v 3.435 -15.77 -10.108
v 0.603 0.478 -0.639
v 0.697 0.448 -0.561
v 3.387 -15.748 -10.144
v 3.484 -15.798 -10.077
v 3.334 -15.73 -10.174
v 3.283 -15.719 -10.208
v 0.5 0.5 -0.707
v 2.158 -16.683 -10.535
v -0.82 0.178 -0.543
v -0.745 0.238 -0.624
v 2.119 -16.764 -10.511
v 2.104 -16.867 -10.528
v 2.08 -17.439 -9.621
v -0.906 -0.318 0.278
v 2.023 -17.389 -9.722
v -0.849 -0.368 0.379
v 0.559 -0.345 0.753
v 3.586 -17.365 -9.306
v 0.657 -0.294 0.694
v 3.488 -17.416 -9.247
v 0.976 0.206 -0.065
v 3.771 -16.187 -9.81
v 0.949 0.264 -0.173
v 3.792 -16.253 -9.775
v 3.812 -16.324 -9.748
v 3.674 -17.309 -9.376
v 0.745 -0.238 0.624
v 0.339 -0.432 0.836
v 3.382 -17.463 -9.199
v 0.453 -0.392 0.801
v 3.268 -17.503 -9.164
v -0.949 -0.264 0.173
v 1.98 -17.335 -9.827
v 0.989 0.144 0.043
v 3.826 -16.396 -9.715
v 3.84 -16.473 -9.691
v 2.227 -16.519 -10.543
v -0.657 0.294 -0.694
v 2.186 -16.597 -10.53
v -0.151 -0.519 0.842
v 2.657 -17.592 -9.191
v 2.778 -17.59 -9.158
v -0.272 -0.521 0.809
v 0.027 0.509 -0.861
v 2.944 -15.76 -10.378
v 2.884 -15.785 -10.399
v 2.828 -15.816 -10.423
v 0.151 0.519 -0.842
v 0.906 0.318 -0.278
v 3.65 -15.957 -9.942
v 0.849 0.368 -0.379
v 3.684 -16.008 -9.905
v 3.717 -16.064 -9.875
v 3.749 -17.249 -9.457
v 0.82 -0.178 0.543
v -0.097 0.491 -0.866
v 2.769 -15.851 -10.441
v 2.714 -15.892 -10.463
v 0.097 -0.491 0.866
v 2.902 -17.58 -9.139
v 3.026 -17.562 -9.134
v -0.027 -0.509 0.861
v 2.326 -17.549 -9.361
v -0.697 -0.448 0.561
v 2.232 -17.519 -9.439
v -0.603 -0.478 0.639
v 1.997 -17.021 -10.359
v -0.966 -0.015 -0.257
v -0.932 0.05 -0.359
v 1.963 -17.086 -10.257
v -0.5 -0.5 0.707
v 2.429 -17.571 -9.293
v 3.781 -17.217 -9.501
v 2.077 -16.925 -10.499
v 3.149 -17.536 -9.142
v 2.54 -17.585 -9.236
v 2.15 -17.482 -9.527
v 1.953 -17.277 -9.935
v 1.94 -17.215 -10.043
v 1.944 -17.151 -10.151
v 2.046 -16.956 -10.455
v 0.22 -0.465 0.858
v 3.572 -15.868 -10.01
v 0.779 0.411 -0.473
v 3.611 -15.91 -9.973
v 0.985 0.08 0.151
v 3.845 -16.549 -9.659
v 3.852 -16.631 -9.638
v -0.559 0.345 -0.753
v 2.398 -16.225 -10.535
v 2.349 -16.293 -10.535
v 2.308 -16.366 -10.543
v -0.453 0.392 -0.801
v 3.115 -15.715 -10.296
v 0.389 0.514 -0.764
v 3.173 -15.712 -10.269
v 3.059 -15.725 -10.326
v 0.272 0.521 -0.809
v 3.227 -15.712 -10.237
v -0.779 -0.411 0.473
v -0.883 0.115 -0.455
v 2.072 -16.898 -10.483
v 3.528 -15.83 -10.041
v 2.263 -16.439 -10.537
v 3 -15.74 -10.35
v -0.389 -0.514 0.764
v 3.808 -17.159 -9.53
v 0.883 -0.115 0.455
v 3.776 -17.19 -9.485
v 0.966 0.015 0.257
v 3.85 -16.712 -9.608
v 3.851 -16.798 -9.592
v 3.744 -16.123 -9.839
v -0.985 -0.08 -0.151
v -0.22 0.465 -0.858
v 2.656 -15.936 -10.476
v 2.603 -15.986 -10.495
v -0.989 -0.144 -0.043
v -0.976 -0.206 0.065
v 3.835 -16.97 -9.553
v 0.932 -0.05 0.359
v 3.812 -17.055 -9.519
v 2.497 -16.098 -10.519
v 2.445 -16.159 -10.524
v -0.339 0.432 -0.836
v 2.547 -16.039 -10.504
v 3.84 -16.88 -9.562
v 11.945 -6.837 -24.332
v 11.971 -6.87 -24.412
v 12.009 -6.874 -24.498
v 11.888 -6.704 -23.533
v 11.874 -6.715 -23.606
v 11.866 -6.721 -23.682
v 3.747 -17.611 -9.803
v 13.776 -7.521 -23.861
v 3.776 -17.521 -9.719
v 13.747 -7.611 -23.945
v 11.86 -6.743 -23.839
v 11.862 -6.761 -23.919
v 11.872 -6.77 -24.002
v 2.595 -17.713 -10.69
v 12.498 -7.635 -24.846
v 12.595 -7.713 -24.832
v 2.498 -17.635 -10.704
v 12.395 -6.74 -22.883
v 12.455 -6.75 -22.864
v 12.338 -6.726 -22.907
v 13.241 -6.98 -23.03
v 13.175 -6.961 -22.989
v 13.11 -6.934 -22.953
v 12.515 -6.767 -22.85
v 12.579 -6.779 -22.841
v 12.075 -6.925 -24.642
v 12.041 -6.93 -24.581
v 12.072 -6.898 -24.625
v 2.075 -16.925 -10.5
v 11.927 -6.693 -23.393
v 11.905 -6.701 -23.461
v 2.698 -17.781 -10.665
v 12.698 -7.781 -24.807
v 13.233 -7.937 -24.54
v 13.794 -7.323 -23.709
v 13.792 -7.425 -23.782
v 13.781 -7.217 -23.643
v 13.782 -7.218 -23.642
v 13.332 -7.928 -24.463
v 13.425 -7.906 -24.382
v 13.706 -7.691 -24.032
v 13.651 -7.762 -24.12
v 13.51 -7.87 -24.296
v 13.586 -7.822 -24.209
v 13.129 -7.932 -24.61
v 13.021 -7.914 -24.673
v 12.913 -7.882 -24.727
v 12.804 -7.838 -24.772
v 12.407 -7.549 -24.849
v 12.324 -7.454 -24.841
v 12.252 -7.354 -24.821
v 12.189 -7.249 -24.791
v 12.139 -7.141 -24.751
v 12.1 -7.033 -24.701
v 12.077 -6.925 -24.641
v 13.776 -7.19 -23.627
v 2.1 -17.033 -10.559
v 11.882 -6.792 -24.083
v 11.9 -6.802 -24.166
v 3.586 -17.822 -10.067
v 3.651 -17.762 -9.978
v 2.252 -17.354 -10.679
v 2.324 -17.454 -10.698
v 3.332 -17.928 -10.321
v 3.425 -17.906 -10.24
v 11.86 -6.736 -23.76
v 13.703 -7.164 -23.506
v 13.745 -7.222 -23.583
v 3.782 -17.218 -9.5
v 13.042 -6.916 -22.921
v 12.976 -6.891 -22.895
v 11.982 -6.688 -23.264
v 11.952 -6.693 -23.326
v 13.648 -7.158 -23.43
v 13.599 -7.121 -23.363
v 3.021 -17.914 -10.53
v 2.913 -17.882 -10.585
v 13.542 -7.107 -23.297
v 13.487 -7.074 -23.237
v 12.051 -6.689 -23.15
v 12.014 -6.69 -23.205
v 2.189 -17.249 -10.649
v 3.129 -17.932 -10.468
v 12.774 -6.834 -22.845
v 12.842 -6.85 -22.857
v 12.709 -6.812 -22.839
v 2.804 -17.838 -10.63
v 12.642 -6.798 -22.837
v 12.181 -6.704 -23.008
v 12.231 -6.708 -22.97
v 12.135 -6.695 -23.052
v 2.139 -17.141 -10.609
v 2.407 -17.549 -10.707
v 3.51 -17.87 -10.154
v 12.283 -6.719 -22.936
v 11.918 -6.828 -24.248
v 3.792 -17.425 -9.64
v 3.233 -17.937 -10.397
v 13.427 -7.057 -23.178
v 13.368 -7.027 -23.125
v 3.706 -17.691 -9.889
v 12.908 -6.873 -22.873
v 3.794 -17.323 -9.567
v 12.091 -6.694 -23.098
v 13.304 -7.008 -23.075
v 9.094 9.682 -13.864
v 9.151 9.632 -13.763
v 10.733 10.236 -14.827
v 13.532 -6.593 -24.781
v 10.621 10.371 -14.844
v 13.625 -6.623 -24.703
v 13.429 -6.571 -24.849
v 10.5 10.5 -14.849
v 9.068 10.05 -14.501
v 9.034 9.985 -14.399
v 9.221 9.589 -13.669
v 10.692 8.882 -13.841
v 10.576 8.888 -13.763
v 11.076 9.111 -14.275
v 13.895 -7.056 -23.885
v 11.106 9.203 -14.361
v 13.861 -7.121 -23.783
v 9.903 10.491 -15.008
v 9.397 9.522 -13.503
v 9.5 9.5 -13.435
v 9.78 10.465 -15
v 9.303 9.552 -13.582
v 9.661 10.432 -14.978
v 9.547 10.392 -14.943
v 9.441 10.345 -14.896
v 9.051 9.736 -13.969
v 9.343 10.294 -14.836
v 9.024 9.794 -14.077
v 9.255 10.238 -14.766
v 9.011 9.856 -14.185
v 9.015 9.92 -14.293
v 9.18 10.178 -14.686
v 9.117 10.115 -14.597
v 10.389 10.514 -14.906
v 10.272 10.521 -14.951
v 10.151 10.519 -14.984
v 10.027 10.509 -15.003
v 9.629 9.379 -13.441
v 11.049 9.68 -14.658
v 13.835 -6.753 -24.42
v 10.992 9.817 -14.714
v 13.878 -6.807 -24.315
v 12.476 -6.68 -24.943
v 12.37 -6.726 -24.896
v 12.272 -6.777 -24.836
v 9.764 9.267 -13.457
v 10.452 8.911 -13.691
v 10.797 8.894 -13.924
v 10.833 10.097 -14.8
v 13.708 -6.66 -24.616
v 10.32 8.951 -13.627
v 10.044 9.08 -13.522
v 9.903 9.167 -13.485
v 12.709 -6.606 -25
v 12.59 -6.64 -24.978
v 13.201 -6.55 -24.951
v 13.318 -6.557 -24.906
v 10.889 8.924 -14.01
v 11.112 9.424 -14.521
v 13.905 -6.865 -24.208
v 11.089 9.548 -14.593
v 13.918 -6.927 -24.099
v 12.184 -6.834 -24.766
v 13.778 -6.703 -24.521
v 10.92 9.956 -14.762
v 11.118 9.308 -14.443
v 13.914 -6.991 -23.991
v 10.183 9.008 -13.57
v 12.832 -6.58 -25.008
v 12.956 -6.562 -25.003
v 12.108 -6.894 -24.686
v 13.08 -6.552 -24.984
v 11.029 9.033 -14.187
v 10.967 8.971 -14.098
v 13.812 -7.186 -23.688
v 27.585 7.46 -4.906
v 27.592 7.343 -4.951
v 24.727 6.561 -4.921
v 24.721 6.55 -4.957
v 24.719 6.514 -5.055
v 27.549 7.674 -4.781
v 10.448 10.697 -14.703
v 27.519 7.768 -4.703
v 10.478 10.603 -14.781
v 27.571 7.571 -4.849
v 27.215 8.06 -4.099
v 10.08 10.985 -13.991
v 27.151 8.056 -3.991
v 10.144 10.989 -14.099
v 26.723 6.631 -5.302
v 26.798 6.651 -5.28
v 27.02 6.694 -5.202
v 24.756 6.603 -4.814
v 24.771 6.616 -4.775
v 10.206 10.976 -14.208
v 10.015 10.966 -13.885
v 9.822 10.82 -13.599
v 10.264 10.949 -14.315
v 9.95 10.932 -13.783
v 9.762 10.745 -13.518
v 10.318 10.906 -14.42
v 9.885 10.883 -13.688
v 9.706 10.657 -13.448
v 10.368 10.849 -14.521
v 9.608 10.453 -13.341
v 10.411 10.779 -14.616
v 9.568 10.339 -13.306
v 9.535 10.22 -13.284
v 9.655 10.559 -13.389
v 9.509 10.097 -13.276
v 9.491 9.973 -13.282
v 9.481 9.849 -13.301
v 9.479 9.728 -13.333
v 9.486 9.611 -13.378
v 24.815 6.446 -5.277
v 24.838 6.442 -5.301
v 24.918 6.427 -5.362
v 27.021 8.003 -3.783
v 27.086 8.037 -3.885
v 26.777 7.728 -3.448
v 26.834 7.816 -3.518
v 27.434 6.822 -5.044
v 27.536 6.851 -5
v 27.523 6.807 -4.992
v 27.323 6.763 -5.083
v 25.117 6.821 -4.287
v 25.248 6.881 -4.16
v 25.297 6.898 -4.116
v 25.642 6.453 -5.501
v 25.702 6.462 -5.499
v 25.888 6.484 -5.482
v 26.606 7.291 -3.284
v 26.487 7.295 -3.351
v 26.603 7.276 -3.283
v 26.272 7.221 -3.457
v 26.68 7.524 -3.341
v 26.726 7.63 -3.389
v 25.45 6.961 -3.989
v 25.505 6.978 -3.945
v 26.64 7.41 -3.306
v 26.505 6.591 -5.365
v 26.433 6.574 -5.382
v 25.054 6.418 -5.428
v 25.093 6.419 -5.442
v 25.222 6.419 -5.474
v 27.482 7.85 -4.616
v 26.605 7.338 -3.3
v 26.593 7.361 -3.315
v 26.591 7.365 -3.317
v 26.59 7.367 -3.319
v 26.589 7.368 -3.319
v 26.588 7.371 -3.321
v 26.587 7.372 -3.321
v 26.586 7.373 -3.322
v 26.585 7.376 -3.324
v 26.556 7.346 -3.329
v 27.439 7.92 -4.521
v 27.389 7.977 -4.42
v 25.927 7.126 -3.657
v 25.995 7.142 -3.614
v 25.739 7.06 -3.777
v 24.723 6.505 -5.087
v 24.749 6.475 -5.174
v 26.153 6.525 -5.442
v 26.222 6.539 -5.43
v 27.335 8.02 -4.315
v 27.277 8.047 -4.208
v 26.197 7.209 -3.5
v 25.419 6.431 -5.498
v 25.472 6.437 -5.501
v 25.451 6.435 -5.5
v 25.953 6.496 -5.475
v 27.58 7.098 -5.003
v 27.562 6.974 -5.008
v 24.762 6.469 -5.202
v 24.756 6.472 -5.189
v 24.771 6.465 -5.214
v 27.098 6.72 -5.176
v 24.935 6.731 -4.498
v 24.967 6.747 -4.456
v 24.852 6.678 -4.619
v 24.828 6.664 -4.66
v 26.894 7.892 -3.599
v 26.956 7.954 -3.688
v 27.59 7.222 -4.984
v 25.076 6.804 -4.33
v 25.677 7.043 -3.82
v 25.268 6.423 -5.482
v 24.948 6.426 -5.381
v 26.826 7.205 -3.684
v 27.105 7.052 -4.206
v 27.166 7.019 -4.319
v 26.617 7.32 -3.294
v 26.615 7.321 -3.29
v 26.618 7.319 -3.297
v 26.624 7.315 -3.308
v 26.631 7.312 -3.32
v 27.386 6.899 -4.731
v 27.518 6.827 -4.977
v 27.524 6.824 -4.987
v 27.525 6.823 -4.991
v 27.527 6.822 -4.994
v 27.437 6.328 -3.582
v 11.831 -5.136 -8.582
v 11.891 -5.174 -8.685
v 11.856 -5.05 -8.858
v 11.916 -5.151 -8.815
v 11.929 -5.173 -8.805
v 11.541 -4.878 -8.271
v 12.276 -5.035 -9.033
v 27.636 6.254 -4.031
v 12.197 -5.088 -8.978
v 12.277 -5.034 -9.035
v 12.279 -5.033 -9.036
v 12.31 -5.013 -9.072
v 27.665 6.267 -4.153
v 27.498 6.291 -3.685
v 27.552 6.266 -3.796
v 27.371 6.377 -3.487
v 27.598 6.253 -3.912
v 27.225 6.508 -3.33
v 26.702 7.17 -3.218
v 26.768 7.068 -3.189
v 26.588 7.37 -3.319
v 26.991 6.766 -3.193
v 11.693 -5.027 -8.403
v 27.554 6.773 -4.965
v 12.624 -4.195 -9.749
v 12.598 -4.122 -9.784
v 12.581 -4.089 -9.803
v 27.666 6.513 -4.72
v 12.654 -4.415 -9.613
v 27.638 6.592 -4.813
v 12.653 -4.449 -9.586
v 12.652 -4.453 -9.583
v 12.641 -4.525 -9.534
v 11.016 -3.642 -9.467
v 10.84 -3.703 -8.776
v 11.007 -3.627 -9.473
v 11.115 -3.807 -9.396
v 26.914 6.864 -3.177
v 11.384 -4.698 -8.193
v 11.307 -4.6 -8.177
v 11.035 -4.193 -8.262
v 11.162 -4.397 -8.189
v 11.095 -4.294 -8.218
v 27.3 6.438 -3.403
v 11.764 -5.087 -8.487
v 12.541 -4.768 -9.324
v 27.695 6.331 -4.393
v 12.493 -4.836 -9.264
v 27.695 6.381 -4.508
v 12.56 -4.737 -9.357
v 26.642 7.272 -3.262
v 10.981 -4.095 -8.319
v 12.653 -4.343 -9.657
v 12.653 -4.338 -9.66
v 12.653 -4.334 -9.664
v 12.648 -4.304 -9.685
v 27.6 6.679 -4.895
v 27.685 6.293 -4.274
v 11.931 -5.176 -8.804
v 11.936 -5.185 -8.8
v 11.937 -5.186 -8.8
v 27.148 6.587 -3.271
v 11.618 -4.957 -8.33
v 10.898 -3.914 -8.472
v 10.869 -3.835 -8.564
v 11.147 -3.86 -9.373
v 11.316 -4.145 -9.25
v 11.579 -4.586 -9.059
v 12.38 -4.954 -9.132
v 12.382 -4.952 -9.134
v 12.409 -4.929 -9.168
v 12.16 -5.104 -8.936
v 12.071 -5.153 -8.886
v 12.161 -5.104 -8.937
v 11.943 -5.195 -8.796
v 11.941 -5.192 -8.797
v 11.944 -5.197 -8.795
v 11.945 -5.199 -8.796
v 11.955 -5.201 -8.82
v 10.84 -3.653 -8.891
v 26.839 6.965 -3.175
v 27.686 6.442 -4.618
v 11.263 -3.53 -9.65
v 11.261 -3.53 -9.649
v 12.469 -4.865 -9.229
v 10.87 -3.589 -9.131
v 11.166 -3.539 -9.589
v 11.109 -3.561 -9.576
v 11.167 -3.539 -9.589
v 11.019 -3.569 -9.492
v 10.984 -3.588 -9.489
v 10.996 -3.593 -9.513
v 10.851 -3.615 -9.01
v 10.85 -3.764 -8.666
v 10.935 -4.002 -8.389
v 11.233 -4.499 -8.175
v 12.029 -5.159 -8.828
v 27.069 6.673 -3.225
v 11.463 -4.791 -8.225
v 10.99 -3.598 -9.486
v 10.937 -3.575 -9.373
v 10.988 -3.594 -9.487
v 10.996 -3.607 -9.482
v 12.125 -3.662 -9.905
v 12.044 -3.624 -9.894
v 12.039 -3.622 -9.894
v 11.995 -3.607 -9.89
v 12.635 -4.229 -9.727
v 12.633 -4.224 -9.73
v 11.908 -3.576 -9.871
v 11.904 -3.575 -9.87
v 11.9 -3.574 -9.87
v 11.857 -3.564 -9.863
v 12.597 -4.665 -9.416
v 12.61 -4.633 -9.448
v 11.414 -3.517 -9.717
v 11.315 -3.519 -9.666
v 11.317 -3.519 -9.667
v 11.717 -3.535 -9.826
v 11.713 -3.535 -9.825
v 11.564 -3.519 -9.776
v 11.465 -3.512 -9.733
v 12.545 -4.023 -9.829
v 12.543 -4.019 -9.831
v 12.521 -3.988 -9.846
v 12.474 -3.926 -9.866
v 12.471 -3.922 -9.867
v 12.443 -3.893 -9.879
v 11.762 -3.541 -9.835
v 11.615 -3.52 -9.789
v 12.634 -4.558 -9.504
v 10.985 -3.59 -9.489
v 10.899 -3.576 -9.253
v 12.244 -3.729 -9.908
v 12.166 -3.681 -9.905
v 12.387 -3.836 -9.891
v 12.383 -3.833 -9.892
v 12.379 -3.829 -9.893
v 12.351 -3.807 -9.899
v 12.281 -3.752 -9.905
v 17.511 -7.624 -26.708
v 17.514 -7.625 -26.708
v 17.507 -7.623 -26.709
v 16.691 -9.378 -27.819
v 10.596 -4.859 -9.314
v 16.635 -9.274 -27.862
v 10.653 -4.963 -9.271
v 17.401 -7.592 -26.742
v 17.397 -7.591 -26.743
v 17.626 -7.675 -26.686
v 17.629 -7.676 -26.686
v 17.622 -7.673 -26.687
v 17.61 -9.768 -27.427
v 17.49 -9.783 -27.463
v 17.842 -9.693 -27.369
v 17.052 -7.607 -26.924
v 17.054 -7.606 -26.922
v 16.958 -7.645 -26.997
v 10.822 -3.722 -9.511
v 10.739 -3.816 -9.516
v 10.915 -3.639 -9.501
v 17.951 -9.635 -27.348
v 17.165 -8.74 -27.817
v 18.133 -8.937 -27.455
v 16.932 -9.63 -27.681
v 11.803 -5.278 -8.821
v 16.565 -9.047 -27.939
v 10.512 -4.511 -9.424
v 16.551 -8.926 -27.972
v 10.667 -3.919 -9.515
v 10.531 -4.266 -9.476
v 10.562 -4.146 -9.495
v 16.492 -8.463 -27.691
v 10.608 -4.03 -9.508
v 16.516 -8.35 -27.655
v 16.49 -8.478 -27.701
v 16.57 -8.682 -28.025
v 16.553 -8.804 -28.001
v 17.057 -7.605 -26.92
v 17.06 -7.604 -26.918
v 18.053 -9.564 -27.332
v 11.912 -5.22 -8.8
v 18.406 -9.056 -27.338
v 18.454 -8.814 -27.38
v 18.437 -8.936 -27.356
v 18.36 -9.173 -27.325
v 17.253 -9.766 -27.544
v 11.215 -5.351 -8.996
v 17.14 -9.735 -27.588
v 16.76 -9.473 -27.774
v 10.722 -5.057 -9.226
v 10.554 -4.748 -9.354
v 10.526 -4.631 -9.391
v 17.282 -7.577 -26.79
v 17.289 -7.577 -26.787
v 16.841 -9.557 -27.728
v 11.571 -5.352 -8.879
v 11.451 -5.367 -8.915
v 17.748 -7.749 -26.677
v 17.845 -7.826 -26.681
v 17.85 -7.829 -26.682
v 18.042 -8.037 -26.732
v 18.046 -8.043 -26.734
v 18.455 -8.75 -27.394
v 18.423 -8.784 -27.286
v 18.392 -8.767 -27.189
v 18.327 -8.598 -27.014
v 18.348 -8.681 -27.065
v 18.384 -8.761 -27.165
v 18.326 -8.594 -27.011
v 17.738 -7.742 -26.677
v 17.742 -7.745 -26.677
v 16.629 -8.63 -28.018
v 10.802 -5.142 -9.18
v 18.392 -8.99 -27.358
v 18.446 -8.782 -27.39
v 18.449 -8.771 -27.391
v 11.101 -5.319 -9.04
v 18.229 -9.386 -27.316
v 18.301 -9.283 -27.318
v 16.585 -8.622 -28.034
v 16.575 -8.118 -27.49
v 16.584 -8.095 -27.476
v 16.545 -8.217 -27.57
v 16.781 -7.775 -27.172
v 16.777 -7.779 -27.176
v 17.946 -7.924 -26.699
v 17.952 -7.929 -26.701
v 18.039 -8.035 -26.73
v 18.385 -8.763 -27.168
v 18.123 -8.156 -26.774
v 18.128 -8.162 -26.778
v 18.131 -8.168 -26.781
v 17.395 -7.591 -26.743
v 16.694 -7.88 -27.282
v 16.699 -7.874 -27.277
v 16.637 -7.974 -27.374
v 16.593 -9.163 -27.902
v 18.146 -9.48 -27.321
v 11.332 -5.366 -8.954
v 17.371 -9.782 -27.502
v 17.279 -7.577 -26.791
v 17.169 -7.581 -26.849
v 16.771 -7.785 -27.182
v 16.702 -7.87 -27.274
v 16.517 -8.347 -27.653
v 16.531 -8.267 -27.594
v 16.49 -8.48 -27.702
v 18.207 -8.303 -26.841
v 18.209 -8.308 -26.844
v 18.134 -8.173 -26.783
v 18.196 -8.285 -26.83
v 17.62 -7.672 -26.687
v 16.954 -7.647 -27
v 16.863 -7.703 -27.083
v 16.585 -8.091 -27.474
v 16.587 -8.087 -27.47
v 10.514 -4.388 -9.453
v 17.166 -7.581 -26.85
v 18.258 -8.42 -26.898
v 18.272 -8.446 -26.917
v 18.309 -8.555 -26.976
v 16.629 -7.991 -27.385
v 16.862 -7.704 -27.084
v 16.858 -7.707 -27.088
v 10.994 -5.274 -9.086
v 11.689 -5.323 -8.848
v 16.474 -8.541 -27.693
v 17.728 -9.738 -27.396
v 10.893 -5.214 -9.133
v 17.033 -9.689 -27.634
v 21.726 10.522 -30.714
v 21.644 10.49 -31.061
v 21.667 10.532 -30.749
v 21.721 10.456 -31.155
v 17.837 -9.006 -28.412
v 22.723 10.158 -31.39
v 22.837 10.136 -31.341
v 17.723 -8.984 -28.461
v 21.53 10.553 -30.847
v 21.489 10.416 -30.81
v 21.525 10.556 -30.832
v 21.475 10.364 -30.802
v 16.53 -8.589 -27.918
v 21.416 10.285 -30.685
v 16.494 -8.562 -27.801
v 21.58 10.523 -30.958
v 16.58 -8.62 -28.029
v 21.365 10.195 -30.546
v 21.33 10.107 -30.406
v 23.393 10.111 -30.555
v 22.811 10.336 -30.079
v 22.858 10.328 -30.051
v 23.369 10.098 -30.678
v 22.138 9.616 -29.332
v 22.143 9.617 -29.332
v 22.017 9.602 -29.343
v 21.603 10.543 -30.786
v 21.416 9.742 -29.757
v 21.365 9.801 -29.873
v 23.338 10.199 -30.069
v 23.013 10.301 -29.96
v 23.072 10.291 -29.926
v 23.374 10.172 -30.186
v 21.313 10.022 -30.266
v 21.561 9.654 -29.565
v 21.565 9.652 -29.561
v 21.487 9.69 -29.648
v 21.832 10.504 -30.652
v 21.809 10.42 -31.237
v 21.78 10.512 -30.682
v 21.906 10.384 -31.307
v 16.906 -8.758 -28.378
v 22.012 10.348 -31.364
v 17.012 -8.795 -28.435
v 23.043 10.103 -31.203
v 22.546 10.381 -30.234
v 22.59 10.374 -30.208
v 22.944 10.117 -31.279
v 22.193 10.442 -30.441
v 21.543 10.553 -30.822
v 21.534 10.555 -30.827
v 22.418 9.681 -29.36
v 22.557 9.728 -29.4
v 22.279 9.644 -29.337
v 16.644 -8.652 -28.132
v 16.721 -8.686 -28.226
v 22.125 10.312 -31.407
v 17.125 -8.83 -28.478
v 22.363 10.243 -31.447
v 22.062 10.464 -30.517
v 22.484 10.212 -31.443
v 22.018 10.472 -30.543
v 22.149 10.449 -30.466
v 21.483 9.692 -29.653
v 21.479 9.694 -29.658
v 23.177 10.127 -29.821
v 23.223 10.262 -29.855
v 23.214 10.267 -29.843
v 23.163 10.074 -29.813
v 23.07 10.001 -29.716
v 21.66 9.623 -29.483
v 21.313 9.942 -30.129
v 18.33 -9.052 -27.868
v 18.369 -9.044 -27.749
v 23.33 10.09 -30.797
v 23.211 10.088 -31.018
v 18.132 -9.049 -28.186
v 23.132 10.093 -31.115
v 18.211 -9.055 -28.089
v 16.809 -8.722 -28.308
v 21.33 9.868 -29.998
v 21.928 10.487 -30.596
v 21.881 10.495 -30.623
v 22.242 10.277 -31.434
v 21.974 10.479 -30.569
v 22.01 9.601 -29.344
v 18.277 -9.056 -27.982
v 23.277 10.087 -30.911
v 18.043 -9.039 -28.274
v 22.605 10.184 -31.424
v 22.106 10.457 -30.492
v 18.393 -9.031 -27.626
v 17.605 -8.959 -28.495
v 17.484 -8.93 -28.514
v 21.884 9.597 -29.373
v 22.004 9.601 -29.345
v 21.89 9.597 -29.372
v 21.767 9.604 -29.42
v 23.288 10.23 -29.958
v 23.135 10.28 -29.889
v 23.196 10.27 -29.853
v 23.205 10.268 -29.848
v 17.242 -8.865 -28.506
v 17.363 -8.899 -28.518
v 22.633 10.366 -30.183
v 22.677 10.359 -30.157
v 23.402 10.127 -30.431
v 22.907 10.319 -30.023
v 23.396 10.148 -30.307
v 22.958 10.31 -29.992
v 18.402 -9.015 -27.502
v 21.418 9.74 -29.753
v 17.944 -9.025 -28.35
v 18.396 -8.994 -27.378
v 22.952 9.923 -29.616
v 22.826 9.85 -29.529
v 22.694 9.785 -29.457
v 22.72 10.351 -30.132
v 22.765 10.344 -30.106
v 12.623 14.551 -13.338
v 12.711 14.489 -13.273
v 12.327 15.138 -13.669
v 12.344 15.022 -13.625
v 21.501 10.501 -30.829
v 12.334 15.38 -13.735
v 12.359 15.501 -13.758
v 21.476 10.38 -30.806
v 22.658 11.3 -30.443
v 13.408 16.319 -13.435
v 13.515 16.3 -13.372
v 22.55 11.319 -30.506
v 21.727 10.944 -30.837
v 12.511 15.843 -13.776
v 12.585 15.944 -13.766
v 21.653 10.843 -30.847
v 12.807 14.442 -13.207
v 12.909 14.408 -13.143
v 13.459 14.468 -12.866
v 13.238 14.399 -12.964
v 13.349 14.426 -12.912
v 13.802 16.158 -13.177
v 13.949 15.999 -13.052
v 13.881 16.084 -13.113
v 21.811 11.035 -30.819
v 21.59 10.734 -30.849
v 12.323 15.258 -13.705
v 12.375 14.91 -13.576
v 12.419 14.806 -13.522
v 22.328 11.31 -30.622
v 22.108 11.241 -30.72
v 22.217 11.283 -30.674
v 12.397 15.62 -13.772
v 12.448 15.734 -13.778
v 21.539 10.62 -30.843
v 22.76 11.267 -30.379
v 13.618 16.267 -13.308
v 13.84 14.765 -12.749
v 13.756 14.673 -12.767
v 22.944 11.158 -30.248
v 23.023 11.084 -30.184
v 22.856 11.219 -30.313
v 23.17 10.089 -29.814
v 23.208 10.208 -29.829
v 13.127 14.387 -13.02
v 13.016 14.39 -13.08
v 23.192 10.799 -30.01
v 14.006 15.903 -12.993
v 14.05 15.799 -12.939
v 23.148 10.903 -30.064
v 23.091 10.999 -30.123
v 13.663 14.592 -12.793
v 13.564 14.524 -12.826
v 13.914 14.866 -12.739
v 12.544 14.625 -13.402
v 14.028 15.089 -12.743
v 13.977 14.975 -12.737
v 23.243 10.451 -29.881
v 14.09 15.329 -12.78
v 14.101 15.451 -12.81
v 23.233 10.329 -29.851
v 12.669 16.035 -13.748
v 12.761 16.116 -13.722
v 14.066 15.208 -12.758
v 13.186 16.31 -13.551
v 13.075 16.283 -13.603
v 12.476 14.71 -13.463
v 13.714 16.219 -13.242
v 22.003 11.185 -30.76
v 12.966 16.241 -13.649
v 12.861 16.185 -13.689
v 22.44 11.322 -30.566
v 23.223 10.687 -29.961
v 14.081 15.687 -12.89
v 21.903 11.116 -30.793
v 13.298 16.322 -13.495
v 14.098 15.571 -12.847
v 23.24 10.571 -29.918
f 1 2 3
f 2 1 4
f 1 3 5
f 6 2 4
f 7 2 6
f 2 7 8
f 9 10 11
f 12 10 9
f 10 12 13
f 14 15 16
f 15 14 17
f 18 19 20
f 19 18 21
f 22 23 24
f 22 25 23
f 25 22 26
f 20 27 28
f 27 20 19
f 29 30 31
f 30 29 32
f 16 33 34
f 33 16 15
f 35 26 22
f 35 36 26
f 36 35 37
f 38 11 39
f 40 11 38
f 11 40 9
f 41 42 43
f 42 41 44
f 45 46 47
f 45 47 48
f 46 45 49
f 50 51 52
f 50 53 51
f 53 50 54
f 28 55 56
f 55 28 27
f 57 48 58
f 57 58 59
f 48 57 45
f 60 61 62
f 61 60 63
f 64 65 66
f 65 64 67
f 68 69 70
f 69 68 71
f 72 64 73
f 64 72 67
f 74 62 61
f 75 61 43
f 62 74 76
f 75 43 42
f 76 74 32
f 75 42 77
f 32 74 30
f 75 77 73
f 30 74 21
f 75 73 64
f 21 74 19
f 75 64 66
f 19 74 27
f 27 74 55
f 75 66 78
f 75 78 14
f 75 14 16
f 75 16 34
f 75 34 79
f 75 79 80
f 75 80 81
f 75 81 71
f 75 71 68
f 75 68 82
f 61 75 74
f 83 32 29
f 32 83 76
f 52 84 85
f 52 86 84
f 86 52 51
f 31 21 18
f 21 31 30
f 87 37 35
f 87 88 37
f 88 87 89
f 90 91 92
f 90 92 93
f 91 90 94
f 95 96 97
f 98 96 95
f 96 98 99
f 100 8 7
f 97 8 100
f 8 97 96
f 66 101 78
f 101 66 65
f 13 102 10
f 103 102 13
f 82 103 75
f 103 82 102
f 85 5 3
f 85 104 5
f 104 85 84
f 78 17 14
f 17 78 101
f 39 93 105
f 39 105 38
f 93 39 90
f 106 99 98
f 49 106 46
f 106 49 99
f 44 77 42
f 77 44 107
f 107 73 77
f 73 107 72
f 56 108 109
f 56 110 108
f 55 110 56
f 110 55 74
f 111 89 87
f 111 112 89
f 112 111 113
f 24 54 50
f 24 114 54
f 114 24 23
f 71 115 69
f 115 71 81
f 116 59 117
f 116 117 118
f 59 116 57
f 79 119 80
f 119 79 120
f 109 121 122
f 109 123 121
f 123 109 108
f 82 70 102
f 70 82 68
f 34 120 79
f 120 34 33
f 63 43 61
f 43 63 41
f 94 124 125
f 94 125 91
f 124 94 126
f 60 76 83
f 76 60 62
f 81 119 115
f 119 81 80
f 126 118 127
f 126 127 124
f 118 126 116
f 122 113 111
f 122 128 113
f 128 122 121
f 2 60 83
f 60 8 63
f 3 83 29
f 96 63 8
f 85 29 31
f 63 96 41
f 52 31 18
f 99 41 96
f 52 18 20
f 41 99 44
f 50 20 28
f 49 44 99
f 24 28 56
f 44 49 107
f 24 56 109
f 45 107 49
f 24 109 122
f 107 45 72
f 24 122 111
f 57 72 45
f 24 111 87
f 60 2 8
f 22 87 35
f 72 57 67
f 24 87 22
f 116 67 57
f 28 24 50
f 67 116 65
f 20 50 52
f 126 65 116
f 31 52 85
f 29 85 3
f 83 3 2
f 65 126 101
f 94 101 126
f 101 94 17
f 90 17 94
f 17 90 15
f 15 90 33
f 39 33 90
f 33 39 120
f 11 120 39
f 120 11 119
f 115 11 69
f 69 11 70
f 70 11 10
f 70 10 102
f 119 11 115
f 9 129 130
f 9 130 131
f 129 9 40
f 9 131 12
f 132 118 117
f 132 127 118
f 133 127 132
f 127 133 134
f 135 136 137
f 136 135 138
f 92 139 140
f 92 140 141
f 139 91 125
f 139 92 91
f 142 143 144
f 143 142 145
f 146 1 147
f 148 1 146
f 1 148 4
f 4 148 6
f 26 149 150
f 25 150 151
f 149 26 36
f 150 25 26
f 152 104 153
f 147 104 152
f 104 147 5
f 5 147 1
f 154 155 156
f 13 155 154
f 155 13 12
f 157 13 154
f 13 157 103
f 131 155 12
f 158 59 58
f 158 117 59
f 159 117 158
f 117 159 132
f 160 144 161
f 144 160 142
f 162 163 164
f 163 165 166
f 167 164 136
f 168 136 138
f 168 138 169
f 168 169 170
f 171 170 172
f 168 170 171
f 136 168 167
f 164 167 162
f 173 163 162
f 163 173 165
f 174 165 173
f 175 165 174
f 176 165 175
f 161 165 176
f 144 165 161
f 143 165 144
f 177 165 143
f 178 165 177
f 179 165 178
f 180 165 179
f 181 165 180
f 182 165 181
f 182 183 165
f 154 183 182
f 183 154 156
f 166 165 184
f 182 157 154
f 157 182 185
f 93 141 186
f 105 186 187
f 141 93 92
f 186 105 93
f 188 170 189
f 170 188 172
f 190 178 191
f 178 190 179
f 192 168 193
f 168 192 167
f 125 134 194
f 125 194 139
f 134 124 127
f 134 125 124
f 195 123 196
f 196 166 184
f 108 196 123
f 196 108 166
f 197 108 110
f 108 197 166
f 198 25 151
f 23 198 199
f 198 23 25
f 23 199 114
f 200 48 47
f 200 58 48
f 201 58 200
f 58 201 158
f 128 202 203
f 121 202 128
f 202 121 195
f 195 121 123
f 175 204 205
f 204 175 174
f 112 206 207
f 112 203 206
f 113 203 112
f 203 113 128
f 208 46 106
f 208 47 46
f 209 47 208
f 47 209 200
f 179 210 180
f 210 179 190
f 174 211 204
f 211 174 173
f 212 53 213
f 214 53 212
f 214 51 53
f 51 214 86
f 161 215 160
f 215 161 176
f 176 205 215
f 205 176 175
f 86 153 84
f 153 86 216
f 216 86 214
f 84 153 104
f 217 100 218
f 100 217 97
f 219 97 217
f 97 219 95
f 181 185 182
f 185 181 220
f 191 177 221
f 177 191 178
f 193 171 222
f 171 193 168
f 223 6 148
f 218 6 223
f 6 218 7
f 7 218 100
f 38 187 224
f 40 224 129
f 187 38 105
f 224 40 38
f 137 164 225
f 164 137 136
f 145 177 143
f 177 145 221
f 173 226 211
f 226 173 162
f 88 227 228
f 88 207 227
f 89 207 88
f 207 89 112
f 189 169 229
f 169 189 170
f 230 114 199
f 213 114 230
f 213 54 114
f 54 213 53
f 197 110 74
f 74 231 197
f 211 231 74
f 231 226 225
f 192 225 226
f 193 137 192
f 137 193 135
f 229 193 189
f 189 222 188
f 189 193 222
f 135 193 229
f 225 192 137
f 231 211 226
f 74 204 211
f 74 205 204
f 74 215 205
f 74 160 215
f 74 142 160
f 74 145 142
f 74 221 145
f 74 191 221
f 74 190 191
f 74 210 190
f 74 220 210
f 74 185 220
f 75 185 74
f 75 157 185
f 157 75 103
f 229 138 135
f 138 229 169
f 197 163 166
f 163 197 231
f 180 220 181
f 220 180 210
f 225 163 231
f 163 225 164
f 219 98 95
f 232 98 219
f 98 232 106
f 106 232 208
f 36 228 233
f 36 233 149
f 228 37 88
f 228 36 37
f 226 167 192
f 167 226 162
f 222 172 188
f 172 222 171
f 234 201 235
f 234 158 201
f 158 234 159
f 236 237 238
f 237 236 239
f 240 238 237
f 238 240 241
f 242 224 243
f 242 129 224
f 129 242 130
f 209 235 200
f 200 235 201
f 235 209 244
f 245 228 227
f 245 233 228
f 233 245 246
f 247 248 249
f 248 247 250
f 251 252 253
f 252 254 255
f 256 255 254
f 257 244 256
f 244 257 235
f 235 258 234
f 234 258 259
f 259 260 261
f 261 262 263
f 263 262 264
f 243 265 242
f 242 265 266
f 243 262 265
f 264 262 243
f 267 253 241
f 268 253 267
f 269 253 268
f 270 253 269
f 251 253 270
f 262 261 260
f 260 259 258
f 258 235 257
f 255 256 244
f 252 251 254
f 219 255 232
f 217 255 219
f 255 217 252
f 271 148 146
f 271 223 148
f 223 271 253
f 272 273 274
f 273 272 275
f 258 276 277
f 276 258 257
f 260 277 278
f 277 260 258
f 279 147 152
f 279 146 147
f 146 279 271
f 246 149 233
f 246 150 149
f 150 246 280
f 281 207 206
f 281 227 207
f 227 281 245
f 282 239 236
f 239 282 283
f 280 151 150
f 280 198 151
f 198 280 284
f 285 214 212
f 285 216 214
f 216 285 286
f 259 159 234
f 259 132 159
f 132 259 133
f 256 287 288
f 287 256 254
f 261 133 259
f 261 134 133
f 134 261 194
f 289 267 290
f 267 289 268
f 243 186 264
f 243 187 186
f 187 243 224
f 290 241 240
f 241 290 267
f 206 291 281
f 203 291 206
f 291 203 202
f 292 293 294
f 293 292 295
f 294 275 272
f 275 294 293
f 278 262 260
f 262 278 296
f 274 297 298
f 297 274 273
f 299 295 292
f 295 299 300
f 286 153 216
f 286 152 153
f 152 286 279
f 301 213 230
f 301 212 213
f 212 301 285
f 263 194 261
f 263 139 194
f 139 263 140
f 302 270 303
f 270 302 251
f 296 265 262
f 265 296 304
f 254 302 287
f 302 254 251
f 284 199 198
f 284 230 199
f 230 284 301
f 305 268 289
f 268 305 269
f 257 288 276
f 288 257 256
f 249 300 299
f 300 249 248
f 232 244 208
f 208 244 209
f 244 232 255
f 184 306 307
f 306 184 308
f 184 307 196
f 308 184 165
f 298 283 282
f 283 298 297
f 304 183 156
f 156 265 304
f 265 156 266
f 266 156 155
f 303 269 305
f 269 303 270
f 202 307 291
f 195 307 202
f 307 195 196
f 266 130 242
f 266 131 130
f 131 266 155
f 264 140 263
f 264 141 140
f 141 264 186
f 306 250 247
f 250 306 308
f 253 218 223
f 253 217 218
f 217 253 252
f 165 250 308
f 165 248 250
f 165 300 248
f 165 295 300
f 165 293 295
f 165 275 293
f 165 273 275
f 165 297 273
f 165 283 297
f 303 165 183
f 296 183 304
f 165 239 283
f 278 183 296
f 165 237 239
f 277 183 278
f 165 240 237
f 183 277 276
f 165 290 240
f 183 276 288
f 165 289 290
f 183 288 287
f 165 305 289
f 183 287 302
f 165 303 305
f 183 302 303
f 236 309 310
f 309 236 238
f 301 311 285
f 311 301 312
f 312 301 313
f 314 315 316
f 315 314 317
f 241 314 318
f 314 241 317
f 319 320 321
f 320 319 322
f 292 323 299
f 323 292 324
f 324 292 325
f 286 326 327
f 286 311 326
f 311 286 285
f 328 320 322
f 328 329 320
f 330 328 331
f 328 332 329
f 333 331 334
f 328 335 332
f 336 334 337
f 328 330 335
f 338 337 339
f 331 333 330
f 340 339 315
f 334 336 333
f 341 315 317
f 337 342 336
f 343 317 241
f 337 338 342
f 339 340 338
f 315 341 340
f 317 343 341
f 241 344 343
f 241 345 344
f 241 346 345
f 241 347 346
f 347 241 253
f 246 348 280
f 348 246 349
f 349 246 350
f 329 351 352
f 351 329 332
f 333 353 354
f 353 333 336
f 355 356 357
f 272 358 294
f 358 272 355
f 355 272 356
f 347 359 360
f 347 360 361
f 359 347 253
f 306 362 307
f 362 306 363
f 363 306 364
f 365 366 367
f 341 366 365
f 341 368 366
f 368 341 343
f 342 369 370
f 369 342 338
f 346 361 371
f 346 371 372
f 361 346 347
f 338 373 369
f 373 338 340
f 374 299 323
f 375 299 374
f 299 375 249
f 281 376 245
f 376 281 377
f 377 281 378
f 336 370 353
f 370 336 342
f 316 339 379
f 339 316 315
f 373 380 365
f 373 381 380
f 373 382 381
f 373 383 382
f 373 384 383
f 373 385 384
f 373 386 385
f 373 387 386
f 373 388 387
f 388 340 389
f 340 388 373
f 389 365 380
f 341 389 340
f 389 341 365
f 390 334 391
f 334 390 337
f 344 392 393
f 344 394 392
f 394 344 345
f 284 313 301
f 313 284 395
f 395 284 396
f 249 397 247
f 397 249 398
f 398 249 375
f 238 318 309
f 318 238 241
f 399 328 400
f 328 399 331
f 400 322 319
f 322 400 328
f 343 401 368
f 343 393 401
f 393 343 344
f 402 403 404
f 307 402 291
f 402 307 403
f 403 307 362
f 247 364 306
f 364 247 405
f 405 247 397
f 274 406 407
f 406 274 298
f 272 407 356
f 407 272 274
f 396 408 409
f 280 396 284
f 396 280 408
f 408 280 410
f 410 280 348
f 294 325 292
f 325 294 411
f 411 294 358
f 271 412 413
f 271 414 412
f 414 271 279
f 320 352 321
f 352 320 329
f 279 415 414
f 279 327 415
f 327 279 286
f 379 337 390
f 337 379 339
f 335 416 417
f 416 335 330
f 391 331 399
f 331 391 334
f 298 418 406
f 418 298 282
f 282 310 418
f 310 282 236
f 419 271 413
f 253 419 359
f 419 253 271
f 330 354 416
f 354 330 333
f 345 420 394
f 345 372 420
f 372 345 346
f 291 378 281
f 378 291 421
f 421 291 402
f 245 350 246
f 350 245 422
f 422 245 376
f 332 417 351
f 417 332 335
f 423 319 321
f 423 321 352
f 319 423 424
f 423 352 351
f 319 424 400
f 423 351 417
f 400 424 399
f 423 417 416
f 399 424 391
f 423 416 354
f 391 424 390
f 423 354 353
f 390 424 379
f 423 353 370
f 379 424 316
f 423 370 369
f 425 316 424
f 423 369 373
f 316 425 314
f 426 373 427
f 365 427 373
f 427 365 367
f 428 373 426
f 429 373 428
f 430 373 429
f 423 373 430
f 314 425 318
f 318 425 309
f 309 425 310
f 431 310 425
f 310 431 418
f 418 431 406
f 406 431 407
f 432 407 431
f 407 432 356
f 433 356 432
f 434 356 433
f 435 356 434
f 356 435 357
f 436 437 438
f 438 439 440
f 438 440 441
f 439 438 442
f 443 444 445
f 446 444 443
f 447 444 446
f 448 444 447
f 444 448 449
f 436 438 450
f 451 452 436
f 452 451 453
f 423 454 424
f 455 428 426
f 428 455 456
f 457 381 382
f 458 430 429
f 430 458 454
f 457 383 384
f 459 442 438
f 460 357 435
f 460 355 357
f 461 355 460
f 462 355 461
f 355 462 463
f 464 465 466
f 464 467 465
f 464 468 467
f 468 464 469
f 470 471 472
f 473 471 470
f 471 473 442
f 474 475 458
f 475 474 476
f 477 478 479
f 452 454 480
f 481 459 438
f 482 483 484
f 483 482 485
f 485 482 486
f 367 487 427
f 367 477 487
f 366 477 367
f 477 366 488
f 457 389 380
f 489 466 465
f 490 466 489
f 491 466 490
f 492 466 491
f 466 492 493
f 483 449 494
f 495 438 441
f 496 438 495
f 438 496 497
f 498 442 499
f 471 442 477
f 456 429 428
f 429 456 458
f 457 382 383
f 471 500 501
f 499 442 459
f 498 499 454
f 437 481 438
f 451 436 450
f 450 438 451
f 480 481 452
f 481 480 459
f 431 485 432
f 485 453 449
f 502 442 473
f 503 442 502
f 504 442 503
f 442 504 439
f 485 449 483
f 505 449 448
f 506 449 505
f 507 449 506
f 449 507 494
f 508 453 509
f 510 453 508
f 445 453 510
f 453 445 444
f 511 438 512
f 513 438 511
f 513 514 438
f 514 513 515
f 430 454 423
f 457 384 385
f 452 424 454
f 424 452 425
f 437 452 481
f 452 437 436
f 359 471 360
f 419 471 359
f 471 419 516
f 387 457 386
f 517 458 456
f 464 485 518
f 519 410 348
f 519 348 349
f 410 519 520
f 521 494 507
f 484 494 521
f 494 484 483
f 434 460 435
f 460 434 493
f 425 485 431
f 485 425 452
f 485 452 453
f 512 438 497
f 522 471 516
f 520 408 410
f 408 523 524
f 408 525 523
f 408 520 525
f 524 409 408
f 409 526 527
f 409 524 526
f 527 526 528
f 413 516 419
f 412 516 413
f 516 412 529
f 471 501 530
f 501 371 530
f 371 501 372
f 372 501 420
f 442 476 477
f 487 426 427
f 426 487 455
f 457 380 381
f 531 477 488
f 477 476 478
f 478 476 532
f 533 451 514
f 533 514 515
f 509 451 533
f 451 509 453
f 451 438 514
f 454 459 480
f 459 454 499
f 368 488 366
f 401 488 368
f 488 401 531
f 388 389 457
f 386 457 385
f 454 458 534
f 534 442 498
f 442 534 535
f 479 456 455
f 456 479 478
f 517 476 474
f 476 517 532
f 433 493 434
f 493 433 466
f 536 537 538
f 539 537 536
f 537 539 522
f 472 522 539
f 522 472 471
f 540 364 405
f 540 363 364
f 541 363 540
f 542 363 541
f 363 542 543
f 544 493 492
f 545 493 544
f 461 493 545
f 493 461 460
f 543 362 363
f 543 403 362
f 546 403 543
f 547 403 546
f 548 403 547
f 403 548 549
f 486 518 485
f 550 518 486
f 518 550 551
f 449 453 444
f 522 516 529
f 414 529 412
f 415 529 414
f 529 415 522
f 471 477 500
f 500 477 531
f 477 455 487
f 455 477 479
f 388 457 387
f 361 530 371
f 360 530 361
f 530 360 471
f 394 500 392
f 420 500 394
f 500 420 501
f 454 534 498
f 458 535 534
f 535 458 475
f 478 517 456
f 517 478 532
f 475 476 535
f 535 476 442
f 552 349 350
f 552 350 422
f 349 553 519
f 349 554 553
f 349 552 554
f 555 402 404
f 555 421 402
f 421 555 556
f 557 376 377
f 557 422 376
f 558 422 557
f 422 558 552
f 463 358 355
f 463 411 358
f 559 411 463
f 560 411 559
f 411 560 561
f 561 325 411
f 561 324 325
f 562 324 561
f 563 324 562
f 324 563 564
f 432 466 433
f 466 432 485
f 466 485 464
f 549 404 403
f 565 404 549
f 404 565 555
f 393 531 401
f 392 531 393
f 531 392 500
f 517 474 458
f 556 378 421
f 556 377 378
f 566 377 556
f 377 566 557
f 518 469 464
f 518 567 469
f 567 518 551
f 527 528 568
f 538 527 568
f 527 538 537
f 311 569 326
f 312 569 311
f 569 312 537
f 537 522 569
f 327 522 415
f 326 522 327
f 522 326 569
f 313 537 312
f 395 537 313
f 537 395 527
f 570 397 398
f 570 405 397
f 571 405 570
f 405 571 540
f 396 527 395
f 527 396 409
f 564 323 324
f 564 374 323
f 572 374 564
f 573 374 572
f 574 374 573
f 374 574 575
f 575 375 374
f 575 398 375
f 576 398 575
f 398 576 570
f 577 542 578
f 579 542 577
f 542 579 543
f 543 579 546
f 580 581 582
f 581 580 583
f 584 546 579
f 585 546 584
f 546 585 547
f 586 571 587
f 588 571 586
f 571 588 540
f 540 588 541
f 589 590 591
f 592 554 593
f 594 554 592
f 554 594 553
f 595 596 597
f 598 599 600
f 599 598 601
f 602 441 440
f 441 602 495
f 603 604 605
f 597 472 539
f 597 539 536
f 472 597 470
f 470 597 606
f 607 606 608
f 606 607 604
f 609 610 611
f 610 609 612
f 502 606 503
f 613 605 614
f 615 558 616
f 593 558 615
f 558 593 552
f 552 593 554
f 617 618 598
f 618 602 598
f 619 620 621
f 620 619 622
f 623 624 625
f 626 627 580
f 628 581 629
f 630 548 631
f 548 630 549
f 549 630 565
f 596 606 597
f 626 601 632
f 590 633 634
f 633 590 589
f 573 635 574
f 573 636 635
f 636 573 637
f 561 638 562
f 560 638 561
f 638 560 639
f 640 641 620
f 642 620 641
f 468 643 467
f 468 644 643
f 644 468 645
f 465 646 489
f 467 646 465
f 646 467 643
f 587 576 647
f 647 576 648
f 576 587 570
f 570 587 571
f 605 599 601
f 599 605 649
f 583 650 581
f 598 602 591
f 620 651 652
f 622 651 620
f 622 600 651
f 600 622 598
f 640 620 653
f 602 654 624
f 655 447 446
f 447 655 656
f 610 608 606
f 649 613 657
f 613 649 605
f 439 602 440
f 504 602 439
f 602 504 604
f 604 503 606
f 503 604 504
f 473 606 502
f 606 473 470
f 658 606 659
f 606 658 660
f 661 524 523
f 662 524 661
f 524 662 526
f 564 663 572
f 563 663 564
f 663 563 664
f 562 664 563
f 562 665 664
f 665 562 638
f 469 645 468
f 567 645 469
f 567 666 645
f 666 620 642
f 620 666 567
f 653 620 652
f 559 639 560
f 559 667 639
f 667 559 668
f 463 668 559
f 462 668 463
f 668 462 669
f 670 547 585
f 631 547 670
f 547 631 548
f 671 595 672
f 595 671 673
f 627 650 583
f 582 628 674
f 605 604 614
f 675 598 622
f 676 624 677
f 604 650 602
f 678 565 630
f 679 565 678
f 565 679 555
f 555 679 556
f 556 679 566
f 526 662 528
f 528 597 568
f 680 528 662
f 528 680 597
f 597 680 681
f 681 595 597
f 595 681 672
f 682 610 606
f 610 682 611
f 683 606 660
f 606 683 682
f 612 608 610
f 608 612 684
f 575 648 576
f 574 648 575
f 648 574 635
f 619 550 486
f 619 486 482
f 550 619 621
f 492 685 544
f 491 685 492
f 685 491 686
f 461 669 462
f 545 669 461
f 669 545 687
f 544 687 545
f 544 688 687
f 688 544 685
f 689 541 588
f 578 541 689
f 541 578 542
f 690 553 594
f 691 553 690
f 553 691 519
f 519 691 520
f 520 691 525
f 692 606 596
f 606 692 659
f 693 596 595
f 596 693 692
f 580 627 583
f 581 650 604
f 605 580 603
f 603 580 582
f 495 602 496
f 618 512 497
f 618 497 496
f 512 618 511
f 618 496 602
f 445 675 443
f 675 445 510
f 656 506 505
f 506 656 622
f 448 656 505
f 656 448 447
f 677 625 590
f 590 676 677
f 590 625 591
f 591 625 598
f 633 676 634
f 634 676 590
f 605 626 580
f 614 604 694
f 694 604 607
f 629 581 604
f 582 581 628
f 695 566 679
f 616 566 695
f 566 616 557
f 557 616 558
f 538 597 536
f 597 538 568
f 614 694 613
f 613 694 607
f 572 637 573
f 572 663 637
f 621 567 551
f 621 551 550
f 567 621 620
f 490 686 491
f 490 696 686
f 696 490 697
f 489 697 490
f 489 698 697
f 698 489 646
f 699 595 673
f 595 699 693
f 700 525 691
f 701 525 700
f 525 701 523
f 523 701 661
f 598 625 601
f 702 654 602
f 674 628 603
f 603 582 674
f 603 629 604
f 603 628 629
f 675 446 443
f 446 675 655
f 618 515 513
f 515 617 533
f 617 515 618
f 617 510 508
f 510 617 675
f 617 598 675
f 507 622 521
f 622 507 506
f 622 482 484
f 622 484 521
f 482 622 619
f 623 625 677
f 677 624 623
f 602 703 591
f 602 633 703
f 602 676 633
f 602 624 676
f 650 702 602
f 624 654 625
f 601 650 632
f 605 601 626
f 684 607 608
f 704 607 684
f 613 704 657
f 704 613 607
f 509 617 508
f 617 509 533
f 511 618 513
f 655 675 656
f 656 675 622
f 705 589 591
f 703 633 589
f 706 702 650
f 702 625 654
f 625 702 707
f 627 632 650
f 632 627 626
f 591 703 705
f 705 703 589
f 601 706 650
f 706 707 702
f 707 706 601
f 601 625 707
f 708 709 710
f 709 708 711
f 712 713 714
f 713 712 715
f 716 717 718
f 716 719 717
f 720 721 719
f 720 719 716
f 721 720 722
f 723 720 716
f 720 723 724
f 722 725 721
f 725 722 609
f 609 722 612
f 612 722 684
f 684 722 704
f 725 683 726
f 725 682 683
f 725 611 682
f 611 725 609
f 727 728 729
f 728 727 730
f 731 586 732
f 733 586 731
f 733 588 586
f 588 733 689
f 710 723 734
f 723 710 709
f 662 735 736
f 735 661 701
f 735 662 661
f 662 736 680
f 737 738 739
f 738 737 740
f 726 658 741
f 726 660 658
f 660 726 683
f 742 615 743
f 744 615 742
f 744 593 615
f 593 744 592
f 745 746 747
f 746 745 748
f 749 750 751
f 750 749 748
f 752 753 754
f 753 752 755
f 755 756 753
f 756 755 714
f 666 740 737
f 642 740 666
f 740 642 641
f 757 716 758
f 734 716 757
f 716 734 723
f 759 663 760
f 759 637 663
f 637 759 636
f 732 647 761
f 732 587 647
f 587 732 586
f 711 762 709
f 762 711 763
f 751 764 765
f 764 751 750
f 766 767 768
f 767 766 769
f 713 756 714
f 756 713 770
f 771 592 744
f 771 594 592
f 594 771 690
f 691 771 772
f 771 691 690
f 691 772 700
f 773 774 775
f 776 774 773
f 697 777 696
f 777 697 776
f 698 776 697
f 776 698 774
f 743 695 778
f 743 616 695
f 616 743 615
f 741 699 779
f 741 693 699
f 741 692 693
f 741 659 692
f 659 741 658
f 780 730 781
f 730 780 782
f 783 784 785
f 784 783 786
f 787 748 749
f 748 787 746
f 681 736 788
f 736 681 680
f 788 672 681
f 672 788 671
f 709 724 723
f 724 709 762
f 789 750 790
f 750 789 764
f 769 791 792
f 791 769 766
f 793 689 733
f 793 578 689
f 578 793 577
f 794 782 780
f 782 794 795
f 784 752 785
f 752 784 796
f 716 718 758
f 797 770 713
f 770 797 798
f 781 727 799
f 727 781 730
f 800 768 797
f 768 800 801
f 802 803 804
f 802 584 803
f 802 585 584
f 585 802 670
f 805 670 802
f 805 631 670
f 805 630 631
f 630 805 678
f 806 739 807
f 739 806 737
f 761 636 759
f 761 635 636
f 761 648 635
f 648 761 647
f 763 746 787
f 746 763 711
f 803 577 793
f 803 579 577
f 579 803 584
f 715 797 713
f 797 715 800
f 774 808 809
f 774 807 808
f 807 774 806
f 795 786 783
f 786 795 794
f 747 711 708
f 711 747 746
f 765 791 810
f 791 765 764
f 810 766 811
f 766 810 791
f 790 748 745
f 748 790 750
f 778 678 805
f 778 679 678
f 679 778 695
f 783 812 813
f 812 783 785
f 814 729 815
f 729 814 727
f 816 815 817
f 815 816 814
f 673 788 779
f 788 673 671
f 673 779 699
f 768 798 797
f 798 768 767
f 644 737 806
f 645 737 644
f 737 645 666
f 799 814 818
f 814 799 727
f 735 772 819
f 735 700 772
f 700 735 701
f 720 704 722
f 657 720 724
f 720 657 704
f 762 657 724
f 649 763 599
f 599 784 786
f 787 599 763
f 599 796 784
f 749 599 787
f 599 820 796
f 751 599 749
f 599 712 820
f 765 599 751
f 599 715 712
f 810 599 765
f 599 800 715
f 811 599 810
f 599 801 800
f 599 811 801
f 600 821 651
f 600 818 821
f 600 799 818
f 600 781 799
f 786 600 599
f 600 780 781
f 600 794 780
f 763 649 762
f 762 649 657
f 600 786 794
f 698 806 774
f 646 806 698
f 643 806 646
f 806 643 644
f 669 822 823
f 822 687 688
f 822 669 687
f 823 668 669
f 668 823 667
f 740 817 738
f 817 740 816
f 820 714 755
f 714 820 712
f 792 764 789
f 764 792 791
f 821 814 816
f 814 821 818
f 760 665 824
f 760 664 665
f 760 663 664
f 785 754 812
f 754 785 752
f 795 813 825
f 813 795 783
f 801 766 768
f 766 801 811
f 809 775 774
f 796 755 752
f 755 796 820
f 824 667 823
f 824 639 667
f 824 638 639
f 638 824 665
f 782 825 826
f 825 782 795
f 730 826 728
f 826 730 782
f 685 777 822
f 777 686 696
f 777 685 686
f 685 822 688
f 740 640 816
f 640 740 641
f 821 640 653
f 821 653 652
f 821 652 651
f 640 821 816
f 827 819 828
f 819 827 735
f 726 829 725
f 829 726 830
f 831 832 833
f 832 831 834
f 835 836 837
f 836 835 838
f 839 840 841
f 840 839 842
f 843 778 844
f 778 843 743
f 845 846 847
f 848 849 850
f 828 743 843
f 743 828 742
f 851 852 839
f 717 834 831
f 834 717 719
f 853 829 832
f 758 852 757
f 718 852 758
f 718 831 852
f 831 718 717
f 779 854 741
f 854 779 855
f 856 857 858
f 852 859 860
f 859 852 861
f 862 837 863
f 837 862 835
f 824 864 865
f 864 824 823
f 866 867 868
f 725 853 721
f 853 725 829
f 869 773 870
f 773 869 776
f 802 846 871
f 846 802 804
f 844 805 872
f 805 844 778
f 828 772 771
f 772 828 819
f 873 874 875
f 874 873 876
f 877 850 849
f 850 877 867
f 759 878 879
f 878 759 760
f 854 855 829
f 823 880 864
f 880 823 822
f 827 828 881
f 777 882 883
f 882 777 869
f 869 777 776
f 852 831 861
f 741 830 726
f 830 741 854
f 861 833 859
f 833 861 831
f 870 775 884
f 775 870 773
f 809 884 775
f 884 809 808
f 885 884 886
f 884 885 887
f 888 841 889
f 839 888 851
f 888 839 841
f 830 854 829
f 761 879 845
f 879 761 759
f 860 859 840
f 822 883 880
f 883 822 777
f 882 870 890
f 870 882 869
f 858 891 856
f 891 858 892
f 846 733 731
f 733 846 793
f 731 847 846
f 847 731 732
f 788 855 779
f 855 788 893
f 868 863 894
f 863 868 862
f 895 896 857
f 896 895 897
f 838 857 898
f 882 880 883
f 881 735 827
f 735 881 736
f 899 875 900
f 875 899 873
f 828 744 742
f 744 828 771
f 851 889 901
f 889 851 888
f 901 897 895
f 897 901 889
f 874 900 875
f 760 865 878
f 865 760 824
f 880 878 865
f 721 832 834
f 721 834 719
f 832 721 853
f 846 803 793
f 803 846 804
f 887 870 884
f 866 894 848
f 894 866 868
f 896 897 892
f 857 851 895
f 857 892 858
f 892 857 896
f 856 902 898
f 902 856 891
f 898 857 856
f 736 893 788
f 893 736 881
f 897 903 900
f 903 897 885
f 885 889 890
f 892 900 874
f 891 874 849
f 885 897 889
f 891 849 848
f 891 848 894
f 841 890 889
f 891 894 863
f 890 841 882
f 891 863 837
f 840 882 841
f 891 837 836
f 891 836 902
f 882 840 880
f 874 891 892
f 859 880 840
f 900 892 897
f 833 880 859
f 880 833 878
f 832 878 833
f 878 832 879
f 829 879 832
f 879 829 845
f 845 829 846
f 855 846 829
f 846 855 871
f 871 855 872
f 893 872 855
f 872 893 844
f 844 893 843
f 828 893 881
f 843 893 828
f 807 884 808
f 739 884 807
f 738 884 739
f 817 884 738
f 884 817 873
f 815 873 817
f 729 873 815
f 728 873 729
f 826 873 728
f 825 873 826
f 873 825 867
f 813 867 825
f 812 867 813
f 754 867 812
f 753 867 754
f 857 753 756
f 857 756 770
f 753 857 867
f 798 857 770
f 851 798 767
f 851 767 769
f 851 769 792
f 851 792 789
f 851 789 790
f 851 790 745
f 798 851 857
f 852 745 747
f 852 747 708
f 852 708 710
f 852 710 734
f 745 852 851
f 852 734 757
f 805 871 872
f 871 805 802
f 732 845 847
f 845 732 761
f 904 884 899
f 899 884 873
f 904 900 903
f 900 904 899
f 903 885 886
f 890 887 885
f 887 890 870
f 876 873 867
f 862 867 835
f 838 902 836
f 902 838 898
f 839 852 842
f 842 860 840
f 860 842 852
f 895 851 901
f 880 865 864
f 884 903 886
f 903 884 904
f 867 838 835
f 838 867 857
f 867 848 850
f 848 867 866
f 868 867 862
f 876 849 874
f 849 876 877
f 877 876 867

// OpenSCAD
l = 20;
rotate([45,45,45]) {
    rotate([90,0,0]) {
        cylinder(l,1,[0,0,0], $fn=50);
    }
    translate([0,-l,0]) {
        rotate([0,90,0]) {
            cylinder(l,1,[0,0,0], $fn=50);
        }
    }
    translate([l,0,0]) {
        rotate([90,0,0]) {
            cylinder(l,1,[0,0,0], $fn=50);
        }
    }
    translate([l,0,0]) {
        rotate([0,0,0]) {
            cylinder(l,1,[0,0,0], $fn=50);
        }
    }
    translate([l,0,l]) {
        rotate([0,-135,45]) {
            cylinder(l,1,[0,0,0], $fn=50);
        }
    }
    translate([l/2,-l/2,l*(1-.7071)]) {
        rotate([100,0,45]) {
            cylinder(l,1,[0,0,0], $fn=50);
        }
    }
    translate([l*1.19,-l*1.19,l*.12]) {
        rotate([0,90,45]) {
            cylinder(l,1,[0,0,0], $fn=50);
        }
    }
    translate([l*1.89,-l*.48,l*.12]) {
        rotate([0,90,135]) {
            cylinder(l,1,[0,0,0], $fn=50);
        }
    }
}
